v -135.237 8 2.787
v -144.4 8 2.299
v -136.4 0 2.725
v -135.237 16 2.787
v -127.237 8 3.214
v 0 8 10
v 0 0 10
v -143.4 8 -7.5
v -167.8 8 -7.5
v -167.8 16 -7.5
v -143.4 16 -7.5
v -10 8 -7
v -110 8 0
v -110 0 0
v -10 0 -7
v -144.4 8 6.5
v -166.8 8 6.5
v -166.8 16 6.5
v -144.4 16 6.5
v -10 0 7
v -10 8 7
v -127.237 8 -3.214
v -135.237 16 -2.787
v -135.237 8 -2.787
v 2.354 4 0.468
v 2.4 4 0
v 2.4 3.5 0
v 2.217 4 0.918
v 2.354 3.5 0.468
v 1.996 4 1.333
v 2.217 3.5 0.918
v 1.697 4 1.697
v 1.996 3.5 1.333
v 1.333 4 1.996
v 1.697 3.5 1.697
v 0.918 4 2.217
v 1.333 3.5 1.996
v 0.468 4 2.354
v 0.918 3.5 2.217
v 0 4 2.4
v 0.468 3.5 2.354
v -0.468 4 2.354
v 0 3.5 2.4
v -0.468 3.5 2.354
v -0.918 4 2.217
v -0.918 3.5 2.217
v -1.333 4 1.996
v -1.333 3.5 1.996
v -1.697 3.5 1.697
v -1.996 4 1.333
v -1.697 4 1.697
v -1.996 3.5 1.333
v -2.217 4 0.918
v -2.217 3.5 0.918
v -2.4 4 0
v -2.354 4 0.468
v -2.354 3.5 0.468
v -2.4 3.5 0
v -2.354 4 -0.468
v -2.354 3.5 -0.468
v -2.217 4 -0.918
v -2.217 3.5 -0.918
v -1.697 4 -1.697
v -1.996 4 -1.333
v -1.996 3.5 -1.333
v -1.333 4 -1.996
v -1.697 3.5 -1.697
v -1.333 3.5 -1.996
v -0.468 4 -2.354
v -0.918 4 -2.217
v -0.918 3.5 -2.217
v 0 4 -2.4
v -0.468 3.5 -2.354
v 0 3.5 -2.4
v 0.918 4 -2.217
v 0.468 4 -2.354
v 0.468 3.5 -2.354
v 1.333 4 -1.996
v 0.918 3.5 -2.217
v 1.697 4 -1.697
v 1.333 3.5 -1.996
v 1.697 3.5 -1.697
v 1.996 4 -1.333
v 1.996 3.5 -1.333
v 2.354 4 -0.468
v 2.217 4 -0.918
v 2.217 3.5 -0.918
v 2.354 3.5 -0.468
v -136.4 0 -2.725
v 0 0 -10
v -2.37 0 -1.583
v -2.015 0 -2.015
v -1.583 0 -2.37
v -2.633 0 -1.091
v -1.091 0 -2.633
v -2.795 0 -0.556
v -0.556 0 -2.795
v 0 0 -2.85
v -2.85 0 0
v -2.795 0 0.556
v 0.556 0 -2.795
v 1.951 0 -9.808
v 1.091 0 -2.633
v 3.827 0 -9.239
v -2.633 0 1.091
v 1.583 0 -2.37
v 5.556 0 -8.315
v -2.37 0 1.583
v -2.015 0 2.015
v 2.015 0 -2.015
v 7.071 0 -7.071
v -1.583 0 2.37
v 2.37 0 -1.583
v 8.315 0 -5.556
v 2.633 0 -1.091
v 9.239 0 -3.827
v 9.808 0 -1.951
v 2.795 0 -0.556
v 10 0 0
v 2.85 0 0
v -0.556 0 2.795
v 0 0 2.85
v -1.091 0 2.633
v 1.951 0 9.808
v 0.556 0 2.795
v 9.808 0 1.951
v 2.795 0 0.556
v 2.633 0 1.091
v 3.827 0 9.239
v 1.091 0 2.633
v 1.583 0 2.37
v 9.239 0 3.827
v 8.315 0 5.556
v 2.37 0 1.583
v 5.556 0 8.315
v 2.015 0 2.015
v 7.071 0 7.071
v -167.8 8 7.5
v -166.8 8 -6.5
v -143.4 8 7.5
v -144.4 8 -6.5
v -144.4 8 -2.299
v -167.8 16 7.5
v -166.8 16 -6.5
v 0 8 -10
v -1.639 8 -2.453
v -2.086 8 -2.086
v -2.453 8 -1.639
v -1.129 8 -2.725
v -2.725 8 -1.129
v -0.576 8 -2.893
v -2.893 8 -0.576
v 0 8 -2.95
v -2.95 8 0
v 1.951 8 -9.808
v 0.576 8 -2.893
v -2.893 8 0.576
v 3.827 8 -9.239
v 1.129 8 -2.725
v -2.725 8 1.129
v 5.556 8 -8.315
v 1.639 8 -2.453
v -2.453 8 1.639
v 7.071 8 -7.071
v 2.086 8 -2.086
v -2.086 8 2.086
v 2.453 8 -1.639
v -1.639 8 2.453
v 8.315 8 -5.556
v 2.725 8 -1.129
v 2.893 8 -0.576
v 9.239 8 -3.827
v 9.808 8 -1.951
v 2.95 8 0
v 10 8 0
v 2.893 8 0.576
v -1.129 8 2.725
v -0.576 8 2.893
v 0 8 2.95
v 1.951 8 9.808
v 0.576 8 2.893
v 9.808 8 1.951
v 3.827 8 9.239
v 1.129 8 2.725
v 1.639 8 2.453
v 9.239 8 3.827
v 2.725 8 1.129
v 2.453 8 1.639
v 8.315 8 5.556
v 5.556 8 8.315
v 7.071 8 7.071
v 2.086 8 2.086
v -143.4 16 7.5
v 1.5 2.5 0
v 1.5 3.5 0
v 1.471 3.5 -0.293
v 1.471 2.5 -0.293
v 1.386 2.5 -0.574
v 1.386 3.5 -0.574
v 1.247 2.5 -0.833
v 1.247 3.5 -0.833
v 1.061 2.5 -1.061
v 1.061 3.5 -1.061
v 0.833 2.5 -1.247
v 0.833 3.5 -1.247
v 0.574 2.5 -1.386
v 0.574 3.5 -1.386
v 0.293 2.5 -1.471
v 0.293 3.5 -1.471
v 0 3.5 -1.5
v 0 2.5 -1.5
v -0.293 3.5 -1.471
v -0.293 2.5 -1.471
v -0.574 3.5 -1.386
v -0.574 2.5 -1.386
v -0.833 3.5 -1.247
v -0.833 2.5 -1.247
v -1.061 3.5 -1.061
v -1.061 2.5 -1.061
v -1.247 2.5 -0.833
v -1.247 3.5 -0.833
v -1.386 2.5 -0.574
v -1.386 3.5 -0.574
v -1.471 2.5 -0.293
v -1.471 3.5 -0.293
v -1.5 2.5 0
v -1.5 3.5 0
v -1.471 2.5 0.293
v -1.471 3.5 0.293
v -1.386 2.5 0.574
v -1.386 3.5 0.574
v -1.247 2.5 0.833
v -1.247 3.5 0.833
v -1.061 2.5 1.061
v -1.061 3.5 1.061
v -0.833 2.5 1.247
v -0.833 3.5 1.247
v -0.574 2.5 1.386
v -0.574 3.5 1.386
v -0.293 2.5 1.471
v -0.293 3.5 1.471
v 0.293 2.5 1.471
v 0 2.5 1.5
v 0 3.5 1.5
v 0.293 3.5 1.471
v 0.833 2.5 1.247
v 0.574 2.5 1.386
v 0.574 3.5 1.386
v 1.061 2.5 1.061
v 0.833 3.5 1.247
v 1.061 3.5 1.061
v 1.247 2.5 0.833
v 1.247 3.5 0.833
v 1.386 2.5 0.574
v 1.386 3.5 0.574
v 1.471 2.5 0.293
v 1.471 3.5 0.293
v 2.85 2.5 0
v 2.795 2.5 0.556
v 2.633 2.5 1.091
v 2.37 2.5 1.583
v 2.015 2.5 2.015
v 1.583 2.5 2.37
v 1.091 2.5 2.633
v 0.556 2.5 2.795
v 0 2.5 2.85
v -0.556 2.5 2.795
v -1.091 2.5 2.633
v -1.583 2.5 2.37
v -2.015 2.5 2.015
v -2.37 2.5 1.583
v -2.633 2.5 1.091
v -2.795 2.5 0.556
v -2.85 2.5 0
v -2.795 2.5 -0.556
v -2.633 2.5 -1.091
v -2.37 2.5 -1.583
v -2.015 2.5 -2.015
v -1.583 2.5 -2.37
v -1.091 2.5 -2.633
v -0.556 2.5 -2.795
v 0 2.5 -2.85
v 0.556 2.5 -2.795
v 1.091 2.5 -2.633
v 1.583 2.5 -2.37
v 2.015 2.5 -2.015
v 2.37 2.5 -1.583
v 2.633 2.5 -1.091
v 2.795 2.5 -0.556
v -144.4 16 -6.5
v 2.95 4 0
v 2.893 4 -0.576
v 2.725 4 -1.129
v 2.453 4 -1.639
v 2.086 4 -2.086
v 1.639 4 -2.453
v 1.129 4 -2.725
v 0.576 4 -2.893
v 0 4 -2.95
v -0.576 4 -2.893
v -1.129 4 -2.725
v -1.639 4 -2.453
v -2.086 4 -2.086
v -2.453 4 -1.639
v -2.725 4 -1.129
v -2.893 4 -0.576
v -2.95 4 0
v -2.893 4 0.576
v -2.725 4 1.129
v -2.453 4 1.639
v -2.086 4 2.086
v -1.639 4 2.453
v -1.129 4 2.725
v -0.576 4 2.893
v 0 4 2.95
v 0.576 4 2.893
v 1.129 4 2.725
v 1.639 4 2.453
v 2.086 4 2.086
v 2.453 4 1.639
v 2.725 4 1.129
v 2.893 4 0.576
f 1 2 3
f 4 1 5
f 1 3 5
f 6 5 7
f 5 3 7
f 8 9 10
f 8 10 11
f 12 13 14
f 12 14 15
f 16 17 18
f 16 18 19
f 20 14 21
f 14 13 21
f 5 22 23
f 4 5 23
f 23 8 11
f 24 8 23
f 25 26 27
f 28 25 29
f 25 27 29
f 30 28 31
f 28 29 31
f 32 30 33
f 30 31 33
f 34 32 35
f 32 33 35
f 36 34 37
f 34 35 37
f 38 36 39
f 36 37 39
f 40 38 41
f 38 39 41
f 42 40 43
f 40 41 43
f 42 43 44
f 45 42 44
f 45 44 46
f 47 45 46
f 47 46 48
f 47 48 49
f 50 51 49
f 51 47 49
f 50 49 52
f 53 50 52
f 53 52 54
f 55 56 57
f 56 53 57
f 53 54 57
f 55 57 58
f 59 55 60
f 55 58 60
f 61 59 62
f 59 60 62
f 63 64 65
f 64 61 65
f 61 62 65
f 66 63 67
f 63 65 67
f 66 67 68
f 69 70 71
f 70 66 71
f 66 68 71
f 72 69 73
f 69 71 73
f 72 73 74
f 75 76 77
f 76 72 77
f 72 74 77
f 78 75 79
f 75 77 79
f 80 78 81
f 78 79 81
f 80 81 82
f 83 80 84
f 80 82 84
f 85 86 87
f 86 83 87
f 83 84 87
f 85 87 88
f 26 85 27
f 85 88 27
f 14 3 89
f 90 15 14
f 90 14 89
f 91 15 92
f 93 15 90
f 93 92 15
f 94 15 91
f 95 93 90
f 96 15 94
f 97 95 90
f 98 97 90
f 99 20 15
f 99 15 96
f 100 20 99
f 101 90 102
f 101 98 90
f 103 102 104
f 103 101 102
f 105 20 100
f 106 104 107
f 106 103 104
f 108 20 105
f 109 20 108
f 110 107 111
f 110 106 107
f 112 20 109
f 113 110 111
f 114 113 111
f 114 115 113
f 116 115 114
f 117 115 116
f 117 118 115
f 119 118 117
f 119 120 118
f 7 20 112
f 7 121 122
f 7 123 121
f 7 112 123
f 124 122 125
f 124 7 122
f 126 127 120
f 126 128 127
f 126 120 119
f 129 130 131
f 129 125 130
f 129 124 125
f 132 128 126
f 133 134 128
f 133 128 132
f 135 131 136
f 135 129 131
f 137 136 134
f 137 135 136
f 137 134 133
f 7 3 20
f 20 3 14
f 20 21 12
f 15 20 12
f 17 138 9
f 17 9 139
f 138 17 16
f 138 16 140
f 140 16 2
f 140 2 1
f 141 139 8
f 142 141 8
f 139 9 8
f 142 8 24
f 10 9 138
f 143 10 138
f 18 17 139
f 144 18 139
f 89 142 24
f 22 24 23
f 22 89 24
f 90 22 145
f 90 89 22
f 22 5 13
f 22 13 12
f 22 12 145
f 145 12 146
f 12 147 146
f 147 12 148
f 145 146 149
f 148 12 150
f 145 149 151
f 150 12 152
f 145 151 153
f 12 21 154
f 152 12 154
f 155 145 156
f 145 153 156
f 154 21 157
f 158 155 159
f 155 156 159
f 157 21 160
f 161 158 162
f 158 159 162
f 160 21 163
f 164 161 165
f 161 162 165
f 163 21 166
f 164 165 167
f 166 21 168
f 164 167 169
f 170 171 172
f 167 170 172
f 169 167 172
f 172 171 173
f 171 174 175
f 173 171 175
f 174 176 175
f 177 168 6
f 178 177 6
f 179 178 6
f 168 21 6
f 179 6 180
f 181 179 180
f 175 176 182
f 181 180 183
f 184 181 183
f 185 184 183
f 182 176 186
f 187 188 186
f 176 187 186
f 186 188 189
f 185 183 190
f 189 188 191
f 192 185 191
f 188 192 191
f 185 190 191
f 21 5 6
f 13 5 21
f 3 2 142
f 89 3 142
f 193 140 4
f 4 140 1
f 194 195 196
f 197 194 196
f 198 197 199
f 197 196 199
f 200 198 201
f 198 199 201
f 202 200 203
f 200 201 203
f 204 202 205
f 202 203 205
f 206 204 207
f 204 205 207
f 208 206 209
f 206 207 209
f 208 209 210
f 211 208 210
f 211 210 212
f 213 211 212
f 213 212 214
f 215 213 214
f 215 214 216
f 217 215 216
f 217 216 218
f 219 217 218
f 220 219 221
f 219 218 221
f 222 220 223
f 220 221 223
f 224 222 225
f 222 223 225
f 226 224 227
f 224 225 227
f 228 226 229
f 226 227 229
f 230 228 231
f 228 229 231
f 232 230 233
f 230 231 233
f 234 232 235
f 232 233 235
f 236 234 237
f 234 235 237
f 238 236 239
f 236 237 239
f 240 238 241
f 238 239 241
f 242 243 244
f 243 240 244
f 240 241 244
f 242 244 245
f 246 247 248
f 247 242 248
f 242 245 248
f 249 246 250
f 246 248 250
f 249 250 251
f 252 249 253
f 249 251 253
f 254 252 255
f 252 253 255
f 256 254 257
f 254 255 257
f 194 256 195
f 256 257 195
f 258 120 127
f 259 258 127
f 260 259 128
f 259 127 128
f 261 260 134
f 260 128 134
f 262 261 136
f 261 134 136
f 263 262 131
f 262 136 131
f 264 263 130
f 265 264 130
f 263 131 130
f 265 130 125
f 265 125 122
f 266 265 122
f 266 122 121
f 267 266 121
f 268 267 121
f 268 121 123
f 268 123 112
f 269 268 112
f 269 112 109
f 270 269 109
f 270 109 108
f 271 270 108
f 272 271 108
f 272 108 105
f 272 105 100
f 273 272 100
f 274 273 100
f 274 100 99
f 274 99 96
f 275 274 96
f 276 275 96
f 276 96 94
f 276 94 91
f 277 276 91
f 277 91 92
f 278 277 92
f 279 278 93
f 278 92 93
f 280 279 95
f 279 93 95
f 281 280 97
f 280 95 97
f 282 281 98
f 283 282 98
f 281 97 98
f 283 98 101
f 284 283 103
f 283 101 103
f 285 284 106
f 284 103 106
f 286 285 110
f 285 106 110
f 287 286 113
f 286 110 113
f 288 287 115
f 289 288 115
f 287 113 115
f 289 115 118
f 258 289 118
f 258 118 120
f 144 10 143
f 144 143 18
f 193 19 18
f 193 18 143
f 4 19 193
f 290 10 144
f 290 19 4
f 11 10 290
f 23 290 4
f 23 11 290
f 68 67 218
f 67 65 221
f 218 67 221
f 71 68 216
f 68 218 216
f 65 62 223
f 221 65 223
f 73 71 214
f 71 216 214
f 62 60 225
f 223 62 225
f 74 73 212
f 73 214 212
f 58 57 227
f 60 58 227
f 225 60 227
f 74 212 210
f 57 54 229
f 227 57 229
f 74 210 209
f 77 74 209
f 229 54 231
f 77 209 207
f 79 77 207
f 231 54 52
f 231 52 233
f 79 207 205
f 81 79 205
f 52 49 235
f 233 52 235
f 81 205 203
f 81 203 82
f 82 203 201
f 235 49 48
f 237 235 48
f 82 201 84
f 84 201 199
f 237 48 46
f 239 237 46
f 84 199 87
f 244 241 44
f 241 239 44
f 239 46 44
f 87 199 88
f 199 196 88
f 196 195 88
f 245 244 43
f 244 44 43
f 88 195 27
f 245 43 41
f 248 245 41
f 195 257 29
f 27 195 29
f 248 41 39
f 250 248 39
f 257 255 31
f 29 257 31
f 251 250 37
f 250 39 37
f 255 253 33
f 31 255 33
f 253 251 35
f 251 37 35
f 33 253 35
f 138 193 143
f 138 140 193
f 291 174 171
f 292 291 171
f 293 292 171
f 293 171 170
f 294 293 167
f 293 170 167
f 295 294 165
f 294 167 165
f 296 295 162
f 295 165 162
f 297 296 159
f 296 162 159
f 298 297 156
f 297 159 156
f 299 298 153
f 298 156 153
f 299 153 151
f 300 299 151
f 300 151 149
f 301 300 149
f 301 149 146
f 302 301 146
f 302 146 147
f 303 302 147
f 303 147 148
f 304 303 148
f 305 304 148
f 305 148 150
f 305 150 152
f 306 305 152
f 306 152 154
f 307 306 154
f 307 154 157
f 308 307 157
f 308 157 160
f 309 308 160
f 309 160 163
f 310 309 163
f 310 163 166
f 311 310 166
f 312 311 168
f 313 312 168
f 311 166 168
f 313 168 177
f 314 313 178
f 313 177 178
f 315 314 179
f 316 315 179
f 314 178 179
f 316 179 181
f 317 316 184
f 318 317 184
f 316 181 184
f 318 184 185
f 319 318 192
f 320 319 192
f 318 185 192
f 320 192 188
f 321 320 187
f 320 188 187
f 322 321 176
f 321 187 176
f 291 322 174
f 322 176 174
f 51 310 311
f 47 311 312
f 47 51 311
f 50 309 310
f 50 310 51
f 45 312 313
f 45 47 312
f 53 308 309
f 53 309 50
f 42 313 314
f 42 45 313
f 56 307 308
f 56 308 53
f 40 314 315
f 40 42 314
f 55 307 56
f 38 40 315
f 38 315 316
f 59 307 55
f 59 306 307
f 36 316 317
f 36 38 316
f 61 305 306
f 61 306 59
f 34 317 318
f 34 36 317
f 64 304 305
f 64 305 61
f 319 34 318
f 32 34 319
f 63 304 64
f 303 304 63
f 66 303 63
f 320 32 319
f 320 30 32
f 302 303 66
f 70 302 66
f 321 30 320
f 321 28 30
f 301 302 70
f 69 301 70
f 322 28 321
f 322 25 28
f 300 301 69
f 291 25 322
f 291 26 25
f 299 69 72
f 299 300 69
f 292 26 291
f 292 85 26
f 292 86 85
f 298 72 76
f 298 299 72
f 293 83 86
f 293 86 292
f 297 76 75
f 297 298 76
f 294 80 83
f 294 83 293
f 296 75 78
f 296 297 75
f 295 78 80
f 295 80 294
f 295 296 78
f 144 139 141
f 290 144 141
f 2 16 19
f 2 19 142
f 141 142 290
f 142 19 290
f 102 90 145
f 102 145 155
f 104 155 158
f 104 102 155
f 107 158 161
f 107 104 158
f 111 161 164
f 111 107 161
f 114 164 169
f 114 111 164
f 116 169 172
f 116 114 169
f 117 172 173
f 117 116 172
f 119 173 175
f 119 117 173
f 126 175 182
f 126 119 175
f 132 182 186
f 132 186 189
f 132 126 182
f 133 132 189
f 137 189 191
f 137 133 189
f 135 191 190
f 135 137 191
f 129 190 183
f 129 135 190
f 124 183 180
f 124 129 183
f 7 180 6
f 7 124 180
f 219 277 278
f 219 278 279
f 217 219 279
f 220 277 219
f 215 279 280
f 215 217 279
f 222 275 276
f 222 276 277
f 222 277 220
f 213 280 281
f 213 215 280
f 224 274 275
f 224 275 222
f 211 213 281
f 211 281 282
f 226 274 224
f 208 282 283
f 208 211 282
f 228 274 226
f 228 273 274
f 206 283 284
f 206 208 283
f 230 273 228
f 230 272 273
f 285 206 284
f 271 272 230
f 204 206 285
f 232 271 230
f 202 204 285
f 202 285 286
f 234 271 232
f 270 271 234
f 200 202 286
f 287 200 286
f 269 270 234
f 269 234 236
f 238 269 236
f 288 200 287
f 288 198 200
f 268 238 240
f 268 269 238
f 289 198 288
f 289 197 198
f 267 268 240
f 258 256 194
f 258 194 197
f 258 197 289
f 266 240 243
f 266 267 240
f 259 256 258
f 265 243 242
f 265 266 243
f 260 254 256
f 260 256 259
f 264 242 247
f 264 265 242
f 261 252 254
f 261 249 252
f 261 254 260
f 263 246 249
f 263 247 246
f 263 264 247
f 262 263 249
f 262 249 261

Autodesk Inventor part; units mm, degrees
ref_plane "YZ Plane" through (0, 0, 0) normal (1, 0, 0) x (0, 1, 0)
ref_plane "XZ Plane" through (0, 0, 0) normal (0, 1, 0) x (-1, 0, 0)
sketch "Szkic1" plane through (-150, 0, 2) normal (0, -1, 0) x (1, 0, 0)
  circle A0 centre (150, -2) radius 2.4
  line L0 (150, -2) -> (150, 8)
  line L1 (150, -2) -> (150, -12)
  arc A1 (150, -12) -> (150, 8) centre (150, -2) ccw
  line L2 (150, -2) -> (0, -2)
  line L3 (150, -2) -> (300, -2) construction
  line L4 (0, -2) -> (0, 0)
  line L5 (0, -2) -> (0, -4)
  line L6 (0, -4) -> (150, -12)
  line L7 (0, 0) -> (150, 8)
  dimension "d0" = 4.8
  dimension "d1" = 10
  dimension "d2" = 10
  dimension "d3" = 150
  dimension "d4" = 180
  dimension "d5" = 2
  dimension "d6" = 2
extrude "Wyciągnięcie proste1" add sketch "Szkic1" against normal blind 8 contours A0 L0 A1 L1 | A0 L2 L4 L7 L0 | L1 L6 L5 L2 A0
sketch "Szkic2" plane through (-150, 8, 2) normal (0, 1, 0) x (1, 0, 0)
  circle A0 centre (150, 2) radius 2.4
  circle A1 centre (150, 2) radius 2.95
  dimension "d9" = 5.9
extrude "Wyciągnięcie proste2" cut sketch "Szkic2" against normal blind 4
ref_plane "Płaszczyzna konstrukcyjna1" through (-150, 3.5, 2) normal (0, -1, 0) x (1, 0, 0)
sketch "Szkic4" plane through (-150, 3.5, 2) normal (0, -1, 0) x (1, 0, 0)
  circle A0 centre (150, -2) radius 1.5
  circle A1 centre (150, -2) radius 2.4
  dimension "d13" = 3
extrude "Wyciągnięcie proste3" add sketch "Szkic4" along normal blind 1
sketch "Szkic5" plane through (-150, 8, 2) normal (0, 1, 0) x (1, 0, 0)
  line L0 (129.6292, 9.8056) -> (142.004, 9.8056) construction
  line L1 (142.004, 9.8056) -> (142.004, -5.0441) construction
  line L2 (142.004, -5.0441) -> (129.6292, -5.0441) construction
  line L3 (129.6292, -5.0441) -> (129.6292, 9.8056) construction
  point P0 (150, 2)
sketch "Szkic6" plane through (-150, 8, 2) normal (0, 1, 0) x (1, 0, 0)
  circle A0 centre (150, 2) radius 1.5 projected
  line L0 (150, 2) -> (0, 2)
  line L1 (150, 2) -> (300, 2) construction
  line L2 (0, 2) -> (5.6, 2)
  line L3 (5.6, 2) -> (-16.8, 2)
  line L4 (5.6, 2) -> (-16.8, 2)
  line L5 (-16.8, 2) -> (-16.8, -4.5)
  line L6 (-16.8, -4.5) -> (5.6, -4.5)
  line L7 (5.6, -4.5) -> (5.6, 2)
  line L8 (5.6, 2) -> (-16.8, 2)
  line L9 (-16.8, 2) -> (-16.8, 8.5)
  line L10 (-16.8, 8.5) -> (5.6, 8.5)
  line L11 (5.6, 8.5) -> (5.6, 2)
  line L12 (5.6, 8.5) -> (5.6, 9.5)
  line L13 (5.6, 9.5) -> (6.6, 9.5)
  line L14 (-16.8, -4.5) -> (-16.8, -5.5)
  line L15 (-16.8, -5.5) -> (-17.8, -5.5)
  line L16 (-17.8, -5.5) -> (6.6, -5.5)
  line L17 (6.6, -5.5) -> (6.6, 9.5)
  line L18 (6.6, 9.5) -> (-17.8, 9.5)
  line L19 (-17.8, 9.5) -> (-17.8, -5.5)
  line L20 (6.6, -5.5) -> (14.7626, -0.7873)
  line L21 (150, -8) -> (0, 0) projected
  line L22 (6.6, -5.5) -> (16.0253, -5.5) construction
  line L23 (6.6, 9.5) -> (14.7626, 4.7873)
  line L24 (14.7626, -0.7873) -> (14.7626, 4.7873)
  point P0 (5.6, 9.5)
  dimension "d16" = 150
  dimension "d17" = 180
  dimension "d18" = 5.6
  dimension "d19" = 22.4
  dimension "d20" = 6.5
  dimension "d21" = 6.5
  dimension "d22" = 1
  dimension "d23" = 1
  dimension "d24" = 1
  dimension "d25" = 1
  dimension "d26" = 30
extrude "Wyciągnięcie proste4" add sketch "Szkic6" along normal blind 8 contours L11 L12 L13 L17 L0 | L0 L17 L21 L7 | L17 L23 L24 L0 | L0 L24 L21 L17 | L21 L17 L16 L14 L6 L7 | L10 L9 L5 L14 L15 L19 L18 L12 | L21 L20 L17
sketch "Szkic7" plane through (-150, 8, 2) normal (0, 1, 0) x (1, 0, 0)
  circle A0 centre (150, 2) radius 1.5 projected
  line L0 (150, 2) -> (140, 2)
  line L1 (140, 2) -> (140, -5)
  line L2 (140, 2) -> (140, 9)
  line L3 (140, 2) -> (40, 2)
  line L4 (40, 2) -> (140, 9)
  line L5 (40, 2) -> (140, -5)
  line L6 (5.6, -0.2987) -> (5.6, 4.2987) projected
  line L7 (5.6, 4.2987) -> (5.6, -0.2987)
  line L8 (0, 0) -> (5.6, -0.2987) projected
  line L9 (5.6, -0.2987) -> (0, 0)
  line L10 (0, 0) -> (0, 4.0412)
  line L11 (0, 4.0412) -> (5.6, 4.2987)
  dimension "d29" = 10
  dimension "d30" = 7
  dimension "d31" = 7
  dimension "d32" = 100
extrude "Wyciągnięcie proste5" cut sketch "Szkic7" against normal through all contours L3 L4 L2 | L1 L5 L3 | L8 L10 L11 L6
chamfer "Faza1" distance 8 angle 45 1 edges at (-135.2374, 8, 0)
chamfer "Faza2" distance 8 angle 45 1 edges at (-144.4, 0, 0)
sketch "Szkic8" plane through (-150, 0, 2) normal (0, -1, 0) x (1, 0, 0)
  circle A0 centre (150, -2) radius 2.4 projected
  line L0 (150, -2) -> (0, -2)
  circle A1 centre (0, -2) radius 2
  dimension "d41" = 150
  dimension "d42" = 4
sketch "Szkic9" plane through (-150, 8, 2) normal (0, -1, 0) x (1, 0, 0)
  point P0 (150, -2)
sketch "Szkic10" plane through (-150, 0, 2) normal (0, -1, 0) x (1, 0, 0)
  circle A0 centre (150, -2) radius 2.85
  dimension "d43" = 5.7
extrude "Wyciągnięcie proste6" cut sketch "Szkic10" against normal blind 2.5
properties part number "pointrer"
